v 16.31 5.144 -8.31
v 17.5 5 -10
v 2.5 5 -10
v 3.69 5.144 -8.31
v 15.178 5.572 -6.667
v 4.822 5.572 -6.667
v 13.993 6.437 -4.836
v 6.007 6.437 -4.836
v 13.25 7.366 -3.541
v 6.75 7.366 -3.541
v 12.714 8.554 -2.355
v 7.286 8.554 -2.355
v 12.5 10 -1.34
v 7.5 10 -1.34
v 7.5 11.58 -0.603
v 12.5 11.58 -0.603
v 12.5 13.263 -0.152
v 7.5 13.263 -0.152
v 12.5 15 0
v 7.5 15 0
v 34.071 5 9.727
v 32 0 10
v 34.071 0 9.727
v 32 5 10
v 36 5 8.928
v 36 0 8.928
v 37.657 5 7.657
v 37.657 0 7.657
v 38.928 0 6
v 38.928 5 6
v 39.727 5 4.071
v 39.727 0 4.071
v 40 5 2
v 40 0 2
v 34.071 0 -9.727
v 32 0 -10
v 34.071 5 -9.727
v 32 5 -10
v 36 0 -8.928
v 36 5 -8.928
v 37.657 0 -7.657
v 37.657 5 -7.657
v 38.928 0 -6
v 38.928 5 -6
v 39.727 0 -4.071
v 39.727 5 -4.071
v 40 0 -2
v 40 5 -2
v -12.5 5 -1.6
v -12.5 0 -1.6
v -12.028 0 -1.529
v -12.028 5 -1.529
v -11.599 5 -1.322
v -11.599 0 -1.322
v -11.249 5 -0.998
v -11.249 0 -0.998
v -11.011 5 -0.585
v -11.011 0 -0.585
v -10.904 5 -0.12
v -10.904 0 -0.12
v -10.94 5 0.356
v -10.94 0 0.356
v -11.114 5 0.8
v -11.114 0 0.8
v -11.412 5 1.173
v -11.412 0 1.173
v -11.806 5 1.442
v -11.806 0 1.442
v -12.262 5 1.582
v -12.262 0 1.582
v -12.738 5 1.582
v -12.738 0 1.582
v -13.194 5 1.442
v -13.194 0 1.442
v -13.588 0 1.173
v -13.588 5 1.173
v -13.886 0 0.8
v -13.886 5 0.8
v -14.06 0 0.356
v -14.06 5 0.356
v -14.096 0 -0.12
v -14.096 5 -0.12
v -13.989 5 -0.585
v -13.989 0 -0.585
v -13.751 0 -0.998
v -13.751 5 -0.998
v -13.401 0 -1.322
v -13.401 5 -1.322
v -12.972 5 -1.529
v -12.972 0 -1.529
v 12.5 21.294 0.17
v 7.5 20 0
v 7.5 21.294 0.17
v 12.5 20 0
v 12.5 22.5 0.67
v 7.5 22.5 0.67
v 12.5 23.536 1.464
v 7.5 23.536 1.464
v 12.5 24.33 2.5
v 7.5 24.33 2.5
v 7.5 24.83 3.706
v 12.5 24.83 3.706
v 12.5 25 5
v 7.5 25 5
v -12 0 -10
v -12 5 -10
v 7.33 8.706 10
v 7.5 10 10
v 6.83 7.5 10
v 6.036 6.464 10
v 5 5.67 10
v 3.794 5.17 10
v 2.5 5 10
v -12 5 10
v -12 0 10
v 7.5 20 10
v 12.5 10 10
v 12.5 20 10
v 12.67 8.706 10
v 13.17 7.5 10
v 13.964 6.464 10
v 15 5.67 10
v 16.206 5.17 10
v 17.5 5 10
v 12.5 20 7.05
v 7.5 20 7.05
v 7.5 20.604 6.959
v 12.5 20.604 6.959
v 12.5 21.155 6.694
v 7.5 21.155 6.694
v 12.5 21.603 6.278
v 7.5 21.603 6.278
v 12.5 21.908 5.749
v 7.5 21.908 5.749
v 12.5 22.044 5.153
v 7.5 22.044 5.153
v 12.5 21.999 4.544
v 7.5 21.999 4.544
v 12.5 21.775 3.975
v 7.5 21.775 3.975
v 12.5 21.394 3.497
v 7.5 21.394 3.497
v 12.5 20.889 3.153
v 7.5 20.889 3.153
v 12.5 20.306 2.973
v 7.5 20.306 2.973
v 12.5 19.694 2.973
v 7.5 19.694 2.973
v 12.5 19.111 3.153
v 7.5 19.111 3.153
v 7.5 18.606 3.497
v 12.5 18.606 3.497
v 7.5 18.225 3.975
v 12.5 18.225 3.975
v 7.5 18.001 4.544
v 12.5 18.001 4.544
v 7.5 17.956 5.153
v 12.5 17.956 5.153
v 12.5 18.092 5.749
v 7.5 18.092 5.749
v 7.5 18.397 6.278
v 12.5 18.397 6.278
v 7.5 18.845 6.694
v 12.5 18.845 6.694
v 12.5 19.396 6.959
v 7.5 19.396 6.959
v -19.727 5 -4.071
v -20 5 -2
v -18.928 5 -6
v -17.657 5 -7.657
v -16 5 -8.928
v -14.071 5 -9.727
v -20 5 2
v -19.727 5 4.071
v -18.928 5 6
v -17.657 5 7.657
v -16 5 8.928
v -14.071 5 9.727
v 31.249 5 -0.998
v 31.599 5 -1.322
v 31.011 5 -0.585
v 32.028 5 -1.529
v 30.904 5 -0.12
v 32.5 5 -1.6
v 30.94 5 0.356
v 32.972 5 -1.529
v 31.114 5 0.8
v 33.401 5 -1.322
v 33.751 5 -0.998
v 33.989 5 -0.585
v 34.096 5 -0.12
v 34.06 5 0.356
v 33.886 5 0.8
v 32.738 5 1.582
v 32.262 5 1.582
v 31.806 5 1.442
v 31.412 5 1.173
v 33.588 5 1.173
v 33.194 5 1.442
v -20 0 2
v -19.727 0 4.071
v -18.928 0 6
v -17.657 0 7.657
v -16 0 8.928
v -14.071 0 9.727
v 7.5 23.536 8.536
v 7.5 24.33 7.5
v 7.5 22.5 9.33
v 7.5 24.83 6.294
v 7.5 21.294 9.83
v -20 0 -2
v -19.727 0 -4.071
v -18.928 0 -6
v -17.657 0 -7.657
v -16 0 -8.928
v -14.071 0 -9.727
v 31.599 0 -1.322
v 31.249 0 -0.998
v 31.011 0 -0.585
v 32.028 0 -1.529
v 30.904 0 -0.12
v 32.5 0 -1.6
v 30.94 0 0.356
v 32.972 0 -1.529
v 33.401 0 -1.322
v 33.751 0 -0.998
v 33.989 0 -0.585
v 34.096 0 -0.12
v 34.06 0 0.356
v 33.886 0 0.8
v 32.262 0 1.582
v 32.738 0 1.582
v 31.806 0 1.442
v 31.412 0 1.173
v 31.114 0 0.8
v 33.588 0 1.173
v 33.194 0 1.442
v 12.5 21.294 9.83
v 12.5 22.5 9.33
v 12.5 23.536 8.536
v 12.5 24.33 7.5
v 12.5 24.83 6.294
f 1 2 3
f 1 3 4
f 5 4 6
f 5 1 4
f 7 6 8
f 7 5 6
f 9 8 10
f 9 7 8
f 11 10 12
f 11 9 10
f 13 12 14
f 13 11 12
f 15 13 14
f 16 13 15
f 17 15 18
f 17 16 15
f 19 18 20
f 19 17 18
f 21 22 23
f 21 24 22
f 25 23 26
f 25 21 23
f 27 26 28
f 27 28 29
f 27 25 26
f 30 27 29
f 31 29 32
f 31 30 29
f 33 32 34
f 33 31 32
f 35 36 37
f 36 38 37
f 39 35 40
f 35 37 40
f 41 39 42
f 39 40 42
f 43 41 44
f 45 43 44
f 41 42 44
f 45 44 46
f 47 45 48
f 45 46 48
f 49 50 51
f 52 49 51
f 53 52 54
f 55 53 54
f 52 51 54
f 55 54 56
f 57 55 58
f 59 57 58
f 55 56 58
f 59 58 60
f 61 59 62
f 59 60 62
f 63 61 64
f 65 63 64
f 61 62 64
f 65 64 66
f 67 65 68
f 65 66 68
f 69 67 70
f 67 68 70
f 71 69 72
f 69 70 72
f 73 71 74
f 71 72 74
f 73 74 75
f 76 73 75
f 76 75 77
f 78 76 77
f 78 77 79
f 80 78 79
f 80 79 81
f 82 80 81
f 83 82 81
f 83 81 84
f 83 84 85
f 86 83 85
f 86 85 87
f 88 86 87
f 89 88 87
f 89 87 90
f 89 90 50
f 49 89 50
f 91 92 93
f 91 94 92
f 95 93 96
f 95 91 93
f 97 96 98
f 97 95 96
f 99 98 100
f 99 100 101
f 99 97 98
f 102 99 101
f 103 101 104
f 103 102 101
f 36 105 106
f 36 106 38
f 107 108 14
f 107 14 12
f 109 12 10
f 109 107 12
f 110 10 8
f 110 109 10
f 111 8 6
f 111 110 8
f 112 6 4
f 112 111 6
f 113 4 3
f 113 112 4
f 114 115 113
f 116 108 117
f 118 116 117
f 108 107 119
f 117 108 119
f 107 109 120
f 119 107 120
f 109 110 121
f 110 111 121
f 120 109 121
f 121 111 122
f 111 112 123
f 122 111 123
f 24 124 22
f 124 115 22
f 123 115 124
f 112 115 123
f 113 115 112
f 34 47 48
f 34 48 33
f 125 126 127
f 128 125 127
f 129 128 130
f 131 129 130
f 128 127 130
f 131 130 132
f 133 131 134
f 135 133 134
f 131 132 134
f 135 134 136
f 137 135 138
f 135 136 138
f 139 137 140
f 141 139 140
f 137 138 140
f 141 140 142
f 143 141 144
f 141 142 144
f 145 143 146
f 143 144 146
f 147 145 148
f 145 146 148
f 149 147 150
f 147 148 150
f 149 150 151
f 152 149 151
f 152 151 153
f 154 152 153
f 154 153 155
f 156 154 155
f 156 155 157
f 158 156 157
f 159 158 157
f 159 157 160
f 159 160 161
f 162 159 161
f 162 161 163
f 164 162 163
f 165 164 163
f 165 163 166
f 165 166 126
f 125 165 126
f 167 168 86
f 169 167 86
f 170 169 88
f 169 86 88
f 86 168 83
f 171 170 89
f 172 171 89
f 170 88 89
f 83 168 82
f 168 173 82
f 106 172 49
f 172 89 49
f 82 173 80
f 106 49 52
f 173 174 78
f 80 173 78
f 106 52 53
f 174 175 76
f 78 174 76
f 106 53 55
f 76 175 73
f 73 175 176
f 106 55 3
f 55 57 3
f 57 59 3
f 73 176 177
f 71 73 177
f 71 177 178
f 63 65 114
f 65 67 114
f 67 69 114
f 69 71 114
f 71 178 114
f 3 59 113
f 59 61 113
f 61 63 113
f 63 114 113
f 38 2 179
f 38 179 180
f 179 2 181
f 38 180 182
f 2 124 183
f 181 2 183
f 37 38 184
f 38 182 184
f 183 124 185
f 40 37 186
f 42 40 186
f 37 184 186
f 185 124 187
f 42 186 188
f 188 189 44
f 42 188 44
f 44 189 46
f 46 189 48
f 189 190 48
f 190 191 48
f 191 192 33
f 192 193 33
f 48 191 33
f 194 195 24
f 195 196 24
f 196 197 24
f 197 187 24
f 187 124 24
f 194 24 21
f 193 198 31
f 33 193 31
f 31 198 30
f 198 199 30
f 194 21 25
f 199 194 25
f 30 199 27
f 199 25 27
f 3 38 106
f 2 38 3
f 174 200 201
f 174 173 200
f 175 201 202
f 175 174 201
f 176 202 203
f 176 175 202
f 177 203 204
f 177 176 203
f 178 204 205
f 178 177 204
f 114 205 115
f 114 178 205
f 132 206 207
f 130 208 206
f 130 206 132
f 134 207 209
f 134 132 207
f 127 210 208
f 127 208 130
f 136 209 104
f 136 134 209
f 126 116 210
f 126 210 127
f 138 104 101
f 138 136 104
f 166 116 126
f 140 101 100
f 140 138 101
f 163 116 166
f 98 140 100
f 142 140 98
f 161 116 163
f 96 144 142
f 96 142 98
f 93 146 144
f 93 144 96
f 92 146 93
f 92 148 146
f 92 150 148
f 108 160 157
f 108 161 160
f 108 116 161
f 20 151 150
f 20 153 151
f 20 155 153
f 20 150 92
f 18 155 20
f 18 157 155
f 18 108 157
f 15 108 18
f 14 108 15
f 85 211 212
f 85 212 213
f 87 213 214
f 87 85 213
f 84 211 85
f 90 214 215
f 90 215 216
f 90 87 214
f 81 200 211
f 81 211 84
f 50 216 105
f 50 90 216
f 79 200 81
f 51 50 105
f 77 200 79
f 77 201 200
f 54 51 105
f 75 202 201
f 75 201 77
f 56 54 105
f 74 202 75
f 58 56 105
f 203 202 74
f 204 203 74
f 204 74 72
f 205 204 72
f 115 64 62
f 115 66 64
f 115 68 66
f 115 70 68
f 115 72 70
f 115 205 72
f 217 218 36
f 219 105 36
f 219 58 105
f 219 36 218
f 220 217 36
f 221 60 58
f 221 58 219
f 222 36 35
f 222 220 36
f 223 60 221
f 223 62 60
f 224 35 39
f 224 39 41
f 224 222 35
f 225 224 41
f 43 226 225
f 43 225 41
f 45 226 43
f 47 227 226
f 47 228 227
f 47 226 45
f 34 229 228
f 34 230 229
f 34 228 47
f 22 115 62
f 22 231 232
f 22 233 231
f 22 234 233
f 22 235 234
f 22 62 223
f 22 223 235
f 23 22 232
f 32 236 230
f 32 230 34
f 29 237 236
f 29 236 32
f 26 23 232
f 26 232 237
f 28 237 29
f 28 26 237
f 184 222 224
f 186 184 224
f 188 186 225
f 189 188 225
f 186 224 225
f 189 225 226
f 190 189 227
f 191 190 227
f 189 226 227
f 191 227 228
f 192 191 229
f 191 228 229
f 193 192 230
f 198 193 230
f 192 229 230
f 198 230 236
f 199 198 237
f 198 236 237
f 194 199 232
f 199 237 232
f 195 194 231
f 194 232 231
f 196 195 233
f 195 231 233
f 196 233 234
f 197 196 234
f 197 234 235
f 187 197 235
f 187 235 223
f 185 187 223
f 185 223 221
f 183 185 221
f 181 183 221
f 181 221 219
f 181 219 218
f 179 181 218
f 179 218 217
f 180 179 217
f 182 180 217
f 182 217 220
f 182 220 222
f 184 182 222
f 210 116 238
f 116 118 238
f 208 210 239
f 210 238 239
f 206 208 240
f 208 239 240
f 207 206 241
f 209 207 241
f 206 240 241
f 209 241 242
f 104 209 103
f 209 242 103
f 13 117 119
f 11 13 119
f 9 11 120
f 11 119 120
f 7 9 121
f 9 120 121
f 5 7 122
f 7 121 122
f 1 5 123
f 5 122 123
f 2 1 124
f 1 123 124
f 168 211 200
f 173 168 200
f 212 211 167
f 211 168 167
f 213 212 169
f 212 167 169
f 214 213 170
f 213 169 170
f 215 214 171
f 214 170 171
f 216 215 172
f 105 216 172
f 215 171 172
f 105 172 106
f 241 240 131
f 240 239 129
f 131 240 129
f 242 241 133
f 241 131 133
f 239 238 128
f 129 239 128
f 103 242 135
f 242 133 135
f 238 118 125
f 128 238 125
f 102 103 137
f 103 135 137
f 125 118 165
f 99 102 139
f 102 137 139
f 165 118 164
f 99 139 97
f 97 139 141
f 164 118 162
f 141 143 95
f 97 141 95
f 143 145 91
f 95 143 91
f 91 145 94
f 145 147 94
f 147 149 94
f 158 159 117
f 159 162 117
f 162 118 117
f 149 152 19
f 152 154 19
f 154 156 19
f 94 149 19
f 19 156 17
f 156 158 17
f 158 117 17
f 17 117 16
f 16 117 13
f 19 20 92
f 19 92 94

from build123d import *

# Parameters (mm, degrees)
SKETCH_1_W          = 20
SKETCH_1_H          = 15
EXTRUDE_1_DEPTH     = 10
SKETCH_2_W          = 60
SKETCH_2_H          = 20
EXTRUDE_2_DEPTH     = 5
SKETCH_3_R          = 1.6
CUT_EXTRUDE_1_DEPTH = 21
FILLET_1_R          = 8
SKETCH_6_W          = 20
SKETCH_6_H          = 10
CUT_EXTRUDE_3_DEPTH = 10
SKETCH_7_W          = 5
SKETCH_7_H          = 10
EXTRUDE_4_DEPTH     = 20
SKETCH_8_R          = 2.05
CUT_EXTRUDE_4_DEPTH = 20
FILLET_2_R          = 5
FILLET_3_R          = 10
FILLET_4_R          = 5


with BuildPart() as part:
    # 草图1 → 凸台-拉伸1 (new body)
    with BuildSketch(Plane.XY):
        with Locations((10, 7.5)):
            Rectangle(SKETCH_1_W, SKETCH_1_H)
    extrude(amount=EXTRUDE_1_DEPTH)

    # 草图2 → 凸台-拉伸2 (add)
    with BuildSketch(Plane.XZ):
        with Locations((10, 0)):
            Rectangle(SKETCH_2_W, SKETCH_2_H)
    extrude(amount=-EXTRUDE_2_DEPTH)

    # 草图3 → 切除-拉伸1 (cut)
    with BuildSketch(Plane.XZ):
        with Locations(Location((-12.5, 0, 0), (0, 0, 270))):
            Circle(SKETCH_3_R)
        with Locations(Location((32.5, 0, 0), (0, 0, 270))):
            Circle(SKETCH_3_R)
    extrude(amount=-CUT_EXTRUDE_1_DEPTH, mode=Mode.SUBTRACT)

    # 圆角1
    fillet_1_edges = [part.edges().sort_by_distance(p)[0] for p in [
        (-20, 2.5, 10),
        (-20, 2.5, -10),
        (40, 2.5, 10),
        (40, 2.5, -10),
    ]]
    fillet(fillet_1_edges, radius=FILLET_1_R)

    # 草图6 → 切除-拉伸3 (cut)
    with BuildSketch(Plane(origin=(0, 15, 0), x_dir=(1, 0, 0), z_dir=(0, 1, 0))):
        with Locations((10, -5)):
            Rectangle(SKETCH_6_W, SKETCH_6_H)
    extrude(amount=-CUT_EXTRUDE_3_DEPTH, mode=Mode.SUBTRACT)

    # 草图7 → 凸台-拉伸4 (add)
    with BuildSketch(Plane(origin=(0, 5, 0), x_dir=(1, 0, 0), z_dir=(0, 1, 0))):
        with Locations((10, -5)):
            Rectangle(SKETCH_7_W, SKETCH_7_H)
    extrude(amount=EXTRUDE_4_DEPTH)

    # 草图8 → 切除-拉伸4 (cut)
    with BuildSketch(Plane.ZY.offset(-7.5)):
        with Locations((5, 20)):
            Circle(SKETCH_8_R)
    extrude(amount=-CUT_EXTRUDE_4_DEPTH, mode=Mode.SUBTRACT)

    # 圆角2
    fillet_2_edges = [part.edges().sort_by_distance(p)[0] for p in [
        (10, 25, 0),
        (10, 25, 10),
    ]]
    fillet(fillet_2_edges, radius=FILLET_2_R - 0.0001)  # a hair under: the kernel refuses the full size

    # 圆角3
    fillet_3_edges = [part.edges().sort_by_distance(p)[0] for p in [
        (10, 5, 0),
    ]]
    fillet(fillet_3_edges, radius=FILLET_3_R - 0.0001)  # a hair under: the kernel refuses the full size

    # 圆角4
    fillet_4_edges = [part.edges().sort_by_distance(p)[0] for p in [
        (7.5, 5, 5e-05),
        (12.5, 5, 5e-05),
    ]]
    fillet(fillet_4_edges, radius=FILLET_4_R)


solid = part.part
